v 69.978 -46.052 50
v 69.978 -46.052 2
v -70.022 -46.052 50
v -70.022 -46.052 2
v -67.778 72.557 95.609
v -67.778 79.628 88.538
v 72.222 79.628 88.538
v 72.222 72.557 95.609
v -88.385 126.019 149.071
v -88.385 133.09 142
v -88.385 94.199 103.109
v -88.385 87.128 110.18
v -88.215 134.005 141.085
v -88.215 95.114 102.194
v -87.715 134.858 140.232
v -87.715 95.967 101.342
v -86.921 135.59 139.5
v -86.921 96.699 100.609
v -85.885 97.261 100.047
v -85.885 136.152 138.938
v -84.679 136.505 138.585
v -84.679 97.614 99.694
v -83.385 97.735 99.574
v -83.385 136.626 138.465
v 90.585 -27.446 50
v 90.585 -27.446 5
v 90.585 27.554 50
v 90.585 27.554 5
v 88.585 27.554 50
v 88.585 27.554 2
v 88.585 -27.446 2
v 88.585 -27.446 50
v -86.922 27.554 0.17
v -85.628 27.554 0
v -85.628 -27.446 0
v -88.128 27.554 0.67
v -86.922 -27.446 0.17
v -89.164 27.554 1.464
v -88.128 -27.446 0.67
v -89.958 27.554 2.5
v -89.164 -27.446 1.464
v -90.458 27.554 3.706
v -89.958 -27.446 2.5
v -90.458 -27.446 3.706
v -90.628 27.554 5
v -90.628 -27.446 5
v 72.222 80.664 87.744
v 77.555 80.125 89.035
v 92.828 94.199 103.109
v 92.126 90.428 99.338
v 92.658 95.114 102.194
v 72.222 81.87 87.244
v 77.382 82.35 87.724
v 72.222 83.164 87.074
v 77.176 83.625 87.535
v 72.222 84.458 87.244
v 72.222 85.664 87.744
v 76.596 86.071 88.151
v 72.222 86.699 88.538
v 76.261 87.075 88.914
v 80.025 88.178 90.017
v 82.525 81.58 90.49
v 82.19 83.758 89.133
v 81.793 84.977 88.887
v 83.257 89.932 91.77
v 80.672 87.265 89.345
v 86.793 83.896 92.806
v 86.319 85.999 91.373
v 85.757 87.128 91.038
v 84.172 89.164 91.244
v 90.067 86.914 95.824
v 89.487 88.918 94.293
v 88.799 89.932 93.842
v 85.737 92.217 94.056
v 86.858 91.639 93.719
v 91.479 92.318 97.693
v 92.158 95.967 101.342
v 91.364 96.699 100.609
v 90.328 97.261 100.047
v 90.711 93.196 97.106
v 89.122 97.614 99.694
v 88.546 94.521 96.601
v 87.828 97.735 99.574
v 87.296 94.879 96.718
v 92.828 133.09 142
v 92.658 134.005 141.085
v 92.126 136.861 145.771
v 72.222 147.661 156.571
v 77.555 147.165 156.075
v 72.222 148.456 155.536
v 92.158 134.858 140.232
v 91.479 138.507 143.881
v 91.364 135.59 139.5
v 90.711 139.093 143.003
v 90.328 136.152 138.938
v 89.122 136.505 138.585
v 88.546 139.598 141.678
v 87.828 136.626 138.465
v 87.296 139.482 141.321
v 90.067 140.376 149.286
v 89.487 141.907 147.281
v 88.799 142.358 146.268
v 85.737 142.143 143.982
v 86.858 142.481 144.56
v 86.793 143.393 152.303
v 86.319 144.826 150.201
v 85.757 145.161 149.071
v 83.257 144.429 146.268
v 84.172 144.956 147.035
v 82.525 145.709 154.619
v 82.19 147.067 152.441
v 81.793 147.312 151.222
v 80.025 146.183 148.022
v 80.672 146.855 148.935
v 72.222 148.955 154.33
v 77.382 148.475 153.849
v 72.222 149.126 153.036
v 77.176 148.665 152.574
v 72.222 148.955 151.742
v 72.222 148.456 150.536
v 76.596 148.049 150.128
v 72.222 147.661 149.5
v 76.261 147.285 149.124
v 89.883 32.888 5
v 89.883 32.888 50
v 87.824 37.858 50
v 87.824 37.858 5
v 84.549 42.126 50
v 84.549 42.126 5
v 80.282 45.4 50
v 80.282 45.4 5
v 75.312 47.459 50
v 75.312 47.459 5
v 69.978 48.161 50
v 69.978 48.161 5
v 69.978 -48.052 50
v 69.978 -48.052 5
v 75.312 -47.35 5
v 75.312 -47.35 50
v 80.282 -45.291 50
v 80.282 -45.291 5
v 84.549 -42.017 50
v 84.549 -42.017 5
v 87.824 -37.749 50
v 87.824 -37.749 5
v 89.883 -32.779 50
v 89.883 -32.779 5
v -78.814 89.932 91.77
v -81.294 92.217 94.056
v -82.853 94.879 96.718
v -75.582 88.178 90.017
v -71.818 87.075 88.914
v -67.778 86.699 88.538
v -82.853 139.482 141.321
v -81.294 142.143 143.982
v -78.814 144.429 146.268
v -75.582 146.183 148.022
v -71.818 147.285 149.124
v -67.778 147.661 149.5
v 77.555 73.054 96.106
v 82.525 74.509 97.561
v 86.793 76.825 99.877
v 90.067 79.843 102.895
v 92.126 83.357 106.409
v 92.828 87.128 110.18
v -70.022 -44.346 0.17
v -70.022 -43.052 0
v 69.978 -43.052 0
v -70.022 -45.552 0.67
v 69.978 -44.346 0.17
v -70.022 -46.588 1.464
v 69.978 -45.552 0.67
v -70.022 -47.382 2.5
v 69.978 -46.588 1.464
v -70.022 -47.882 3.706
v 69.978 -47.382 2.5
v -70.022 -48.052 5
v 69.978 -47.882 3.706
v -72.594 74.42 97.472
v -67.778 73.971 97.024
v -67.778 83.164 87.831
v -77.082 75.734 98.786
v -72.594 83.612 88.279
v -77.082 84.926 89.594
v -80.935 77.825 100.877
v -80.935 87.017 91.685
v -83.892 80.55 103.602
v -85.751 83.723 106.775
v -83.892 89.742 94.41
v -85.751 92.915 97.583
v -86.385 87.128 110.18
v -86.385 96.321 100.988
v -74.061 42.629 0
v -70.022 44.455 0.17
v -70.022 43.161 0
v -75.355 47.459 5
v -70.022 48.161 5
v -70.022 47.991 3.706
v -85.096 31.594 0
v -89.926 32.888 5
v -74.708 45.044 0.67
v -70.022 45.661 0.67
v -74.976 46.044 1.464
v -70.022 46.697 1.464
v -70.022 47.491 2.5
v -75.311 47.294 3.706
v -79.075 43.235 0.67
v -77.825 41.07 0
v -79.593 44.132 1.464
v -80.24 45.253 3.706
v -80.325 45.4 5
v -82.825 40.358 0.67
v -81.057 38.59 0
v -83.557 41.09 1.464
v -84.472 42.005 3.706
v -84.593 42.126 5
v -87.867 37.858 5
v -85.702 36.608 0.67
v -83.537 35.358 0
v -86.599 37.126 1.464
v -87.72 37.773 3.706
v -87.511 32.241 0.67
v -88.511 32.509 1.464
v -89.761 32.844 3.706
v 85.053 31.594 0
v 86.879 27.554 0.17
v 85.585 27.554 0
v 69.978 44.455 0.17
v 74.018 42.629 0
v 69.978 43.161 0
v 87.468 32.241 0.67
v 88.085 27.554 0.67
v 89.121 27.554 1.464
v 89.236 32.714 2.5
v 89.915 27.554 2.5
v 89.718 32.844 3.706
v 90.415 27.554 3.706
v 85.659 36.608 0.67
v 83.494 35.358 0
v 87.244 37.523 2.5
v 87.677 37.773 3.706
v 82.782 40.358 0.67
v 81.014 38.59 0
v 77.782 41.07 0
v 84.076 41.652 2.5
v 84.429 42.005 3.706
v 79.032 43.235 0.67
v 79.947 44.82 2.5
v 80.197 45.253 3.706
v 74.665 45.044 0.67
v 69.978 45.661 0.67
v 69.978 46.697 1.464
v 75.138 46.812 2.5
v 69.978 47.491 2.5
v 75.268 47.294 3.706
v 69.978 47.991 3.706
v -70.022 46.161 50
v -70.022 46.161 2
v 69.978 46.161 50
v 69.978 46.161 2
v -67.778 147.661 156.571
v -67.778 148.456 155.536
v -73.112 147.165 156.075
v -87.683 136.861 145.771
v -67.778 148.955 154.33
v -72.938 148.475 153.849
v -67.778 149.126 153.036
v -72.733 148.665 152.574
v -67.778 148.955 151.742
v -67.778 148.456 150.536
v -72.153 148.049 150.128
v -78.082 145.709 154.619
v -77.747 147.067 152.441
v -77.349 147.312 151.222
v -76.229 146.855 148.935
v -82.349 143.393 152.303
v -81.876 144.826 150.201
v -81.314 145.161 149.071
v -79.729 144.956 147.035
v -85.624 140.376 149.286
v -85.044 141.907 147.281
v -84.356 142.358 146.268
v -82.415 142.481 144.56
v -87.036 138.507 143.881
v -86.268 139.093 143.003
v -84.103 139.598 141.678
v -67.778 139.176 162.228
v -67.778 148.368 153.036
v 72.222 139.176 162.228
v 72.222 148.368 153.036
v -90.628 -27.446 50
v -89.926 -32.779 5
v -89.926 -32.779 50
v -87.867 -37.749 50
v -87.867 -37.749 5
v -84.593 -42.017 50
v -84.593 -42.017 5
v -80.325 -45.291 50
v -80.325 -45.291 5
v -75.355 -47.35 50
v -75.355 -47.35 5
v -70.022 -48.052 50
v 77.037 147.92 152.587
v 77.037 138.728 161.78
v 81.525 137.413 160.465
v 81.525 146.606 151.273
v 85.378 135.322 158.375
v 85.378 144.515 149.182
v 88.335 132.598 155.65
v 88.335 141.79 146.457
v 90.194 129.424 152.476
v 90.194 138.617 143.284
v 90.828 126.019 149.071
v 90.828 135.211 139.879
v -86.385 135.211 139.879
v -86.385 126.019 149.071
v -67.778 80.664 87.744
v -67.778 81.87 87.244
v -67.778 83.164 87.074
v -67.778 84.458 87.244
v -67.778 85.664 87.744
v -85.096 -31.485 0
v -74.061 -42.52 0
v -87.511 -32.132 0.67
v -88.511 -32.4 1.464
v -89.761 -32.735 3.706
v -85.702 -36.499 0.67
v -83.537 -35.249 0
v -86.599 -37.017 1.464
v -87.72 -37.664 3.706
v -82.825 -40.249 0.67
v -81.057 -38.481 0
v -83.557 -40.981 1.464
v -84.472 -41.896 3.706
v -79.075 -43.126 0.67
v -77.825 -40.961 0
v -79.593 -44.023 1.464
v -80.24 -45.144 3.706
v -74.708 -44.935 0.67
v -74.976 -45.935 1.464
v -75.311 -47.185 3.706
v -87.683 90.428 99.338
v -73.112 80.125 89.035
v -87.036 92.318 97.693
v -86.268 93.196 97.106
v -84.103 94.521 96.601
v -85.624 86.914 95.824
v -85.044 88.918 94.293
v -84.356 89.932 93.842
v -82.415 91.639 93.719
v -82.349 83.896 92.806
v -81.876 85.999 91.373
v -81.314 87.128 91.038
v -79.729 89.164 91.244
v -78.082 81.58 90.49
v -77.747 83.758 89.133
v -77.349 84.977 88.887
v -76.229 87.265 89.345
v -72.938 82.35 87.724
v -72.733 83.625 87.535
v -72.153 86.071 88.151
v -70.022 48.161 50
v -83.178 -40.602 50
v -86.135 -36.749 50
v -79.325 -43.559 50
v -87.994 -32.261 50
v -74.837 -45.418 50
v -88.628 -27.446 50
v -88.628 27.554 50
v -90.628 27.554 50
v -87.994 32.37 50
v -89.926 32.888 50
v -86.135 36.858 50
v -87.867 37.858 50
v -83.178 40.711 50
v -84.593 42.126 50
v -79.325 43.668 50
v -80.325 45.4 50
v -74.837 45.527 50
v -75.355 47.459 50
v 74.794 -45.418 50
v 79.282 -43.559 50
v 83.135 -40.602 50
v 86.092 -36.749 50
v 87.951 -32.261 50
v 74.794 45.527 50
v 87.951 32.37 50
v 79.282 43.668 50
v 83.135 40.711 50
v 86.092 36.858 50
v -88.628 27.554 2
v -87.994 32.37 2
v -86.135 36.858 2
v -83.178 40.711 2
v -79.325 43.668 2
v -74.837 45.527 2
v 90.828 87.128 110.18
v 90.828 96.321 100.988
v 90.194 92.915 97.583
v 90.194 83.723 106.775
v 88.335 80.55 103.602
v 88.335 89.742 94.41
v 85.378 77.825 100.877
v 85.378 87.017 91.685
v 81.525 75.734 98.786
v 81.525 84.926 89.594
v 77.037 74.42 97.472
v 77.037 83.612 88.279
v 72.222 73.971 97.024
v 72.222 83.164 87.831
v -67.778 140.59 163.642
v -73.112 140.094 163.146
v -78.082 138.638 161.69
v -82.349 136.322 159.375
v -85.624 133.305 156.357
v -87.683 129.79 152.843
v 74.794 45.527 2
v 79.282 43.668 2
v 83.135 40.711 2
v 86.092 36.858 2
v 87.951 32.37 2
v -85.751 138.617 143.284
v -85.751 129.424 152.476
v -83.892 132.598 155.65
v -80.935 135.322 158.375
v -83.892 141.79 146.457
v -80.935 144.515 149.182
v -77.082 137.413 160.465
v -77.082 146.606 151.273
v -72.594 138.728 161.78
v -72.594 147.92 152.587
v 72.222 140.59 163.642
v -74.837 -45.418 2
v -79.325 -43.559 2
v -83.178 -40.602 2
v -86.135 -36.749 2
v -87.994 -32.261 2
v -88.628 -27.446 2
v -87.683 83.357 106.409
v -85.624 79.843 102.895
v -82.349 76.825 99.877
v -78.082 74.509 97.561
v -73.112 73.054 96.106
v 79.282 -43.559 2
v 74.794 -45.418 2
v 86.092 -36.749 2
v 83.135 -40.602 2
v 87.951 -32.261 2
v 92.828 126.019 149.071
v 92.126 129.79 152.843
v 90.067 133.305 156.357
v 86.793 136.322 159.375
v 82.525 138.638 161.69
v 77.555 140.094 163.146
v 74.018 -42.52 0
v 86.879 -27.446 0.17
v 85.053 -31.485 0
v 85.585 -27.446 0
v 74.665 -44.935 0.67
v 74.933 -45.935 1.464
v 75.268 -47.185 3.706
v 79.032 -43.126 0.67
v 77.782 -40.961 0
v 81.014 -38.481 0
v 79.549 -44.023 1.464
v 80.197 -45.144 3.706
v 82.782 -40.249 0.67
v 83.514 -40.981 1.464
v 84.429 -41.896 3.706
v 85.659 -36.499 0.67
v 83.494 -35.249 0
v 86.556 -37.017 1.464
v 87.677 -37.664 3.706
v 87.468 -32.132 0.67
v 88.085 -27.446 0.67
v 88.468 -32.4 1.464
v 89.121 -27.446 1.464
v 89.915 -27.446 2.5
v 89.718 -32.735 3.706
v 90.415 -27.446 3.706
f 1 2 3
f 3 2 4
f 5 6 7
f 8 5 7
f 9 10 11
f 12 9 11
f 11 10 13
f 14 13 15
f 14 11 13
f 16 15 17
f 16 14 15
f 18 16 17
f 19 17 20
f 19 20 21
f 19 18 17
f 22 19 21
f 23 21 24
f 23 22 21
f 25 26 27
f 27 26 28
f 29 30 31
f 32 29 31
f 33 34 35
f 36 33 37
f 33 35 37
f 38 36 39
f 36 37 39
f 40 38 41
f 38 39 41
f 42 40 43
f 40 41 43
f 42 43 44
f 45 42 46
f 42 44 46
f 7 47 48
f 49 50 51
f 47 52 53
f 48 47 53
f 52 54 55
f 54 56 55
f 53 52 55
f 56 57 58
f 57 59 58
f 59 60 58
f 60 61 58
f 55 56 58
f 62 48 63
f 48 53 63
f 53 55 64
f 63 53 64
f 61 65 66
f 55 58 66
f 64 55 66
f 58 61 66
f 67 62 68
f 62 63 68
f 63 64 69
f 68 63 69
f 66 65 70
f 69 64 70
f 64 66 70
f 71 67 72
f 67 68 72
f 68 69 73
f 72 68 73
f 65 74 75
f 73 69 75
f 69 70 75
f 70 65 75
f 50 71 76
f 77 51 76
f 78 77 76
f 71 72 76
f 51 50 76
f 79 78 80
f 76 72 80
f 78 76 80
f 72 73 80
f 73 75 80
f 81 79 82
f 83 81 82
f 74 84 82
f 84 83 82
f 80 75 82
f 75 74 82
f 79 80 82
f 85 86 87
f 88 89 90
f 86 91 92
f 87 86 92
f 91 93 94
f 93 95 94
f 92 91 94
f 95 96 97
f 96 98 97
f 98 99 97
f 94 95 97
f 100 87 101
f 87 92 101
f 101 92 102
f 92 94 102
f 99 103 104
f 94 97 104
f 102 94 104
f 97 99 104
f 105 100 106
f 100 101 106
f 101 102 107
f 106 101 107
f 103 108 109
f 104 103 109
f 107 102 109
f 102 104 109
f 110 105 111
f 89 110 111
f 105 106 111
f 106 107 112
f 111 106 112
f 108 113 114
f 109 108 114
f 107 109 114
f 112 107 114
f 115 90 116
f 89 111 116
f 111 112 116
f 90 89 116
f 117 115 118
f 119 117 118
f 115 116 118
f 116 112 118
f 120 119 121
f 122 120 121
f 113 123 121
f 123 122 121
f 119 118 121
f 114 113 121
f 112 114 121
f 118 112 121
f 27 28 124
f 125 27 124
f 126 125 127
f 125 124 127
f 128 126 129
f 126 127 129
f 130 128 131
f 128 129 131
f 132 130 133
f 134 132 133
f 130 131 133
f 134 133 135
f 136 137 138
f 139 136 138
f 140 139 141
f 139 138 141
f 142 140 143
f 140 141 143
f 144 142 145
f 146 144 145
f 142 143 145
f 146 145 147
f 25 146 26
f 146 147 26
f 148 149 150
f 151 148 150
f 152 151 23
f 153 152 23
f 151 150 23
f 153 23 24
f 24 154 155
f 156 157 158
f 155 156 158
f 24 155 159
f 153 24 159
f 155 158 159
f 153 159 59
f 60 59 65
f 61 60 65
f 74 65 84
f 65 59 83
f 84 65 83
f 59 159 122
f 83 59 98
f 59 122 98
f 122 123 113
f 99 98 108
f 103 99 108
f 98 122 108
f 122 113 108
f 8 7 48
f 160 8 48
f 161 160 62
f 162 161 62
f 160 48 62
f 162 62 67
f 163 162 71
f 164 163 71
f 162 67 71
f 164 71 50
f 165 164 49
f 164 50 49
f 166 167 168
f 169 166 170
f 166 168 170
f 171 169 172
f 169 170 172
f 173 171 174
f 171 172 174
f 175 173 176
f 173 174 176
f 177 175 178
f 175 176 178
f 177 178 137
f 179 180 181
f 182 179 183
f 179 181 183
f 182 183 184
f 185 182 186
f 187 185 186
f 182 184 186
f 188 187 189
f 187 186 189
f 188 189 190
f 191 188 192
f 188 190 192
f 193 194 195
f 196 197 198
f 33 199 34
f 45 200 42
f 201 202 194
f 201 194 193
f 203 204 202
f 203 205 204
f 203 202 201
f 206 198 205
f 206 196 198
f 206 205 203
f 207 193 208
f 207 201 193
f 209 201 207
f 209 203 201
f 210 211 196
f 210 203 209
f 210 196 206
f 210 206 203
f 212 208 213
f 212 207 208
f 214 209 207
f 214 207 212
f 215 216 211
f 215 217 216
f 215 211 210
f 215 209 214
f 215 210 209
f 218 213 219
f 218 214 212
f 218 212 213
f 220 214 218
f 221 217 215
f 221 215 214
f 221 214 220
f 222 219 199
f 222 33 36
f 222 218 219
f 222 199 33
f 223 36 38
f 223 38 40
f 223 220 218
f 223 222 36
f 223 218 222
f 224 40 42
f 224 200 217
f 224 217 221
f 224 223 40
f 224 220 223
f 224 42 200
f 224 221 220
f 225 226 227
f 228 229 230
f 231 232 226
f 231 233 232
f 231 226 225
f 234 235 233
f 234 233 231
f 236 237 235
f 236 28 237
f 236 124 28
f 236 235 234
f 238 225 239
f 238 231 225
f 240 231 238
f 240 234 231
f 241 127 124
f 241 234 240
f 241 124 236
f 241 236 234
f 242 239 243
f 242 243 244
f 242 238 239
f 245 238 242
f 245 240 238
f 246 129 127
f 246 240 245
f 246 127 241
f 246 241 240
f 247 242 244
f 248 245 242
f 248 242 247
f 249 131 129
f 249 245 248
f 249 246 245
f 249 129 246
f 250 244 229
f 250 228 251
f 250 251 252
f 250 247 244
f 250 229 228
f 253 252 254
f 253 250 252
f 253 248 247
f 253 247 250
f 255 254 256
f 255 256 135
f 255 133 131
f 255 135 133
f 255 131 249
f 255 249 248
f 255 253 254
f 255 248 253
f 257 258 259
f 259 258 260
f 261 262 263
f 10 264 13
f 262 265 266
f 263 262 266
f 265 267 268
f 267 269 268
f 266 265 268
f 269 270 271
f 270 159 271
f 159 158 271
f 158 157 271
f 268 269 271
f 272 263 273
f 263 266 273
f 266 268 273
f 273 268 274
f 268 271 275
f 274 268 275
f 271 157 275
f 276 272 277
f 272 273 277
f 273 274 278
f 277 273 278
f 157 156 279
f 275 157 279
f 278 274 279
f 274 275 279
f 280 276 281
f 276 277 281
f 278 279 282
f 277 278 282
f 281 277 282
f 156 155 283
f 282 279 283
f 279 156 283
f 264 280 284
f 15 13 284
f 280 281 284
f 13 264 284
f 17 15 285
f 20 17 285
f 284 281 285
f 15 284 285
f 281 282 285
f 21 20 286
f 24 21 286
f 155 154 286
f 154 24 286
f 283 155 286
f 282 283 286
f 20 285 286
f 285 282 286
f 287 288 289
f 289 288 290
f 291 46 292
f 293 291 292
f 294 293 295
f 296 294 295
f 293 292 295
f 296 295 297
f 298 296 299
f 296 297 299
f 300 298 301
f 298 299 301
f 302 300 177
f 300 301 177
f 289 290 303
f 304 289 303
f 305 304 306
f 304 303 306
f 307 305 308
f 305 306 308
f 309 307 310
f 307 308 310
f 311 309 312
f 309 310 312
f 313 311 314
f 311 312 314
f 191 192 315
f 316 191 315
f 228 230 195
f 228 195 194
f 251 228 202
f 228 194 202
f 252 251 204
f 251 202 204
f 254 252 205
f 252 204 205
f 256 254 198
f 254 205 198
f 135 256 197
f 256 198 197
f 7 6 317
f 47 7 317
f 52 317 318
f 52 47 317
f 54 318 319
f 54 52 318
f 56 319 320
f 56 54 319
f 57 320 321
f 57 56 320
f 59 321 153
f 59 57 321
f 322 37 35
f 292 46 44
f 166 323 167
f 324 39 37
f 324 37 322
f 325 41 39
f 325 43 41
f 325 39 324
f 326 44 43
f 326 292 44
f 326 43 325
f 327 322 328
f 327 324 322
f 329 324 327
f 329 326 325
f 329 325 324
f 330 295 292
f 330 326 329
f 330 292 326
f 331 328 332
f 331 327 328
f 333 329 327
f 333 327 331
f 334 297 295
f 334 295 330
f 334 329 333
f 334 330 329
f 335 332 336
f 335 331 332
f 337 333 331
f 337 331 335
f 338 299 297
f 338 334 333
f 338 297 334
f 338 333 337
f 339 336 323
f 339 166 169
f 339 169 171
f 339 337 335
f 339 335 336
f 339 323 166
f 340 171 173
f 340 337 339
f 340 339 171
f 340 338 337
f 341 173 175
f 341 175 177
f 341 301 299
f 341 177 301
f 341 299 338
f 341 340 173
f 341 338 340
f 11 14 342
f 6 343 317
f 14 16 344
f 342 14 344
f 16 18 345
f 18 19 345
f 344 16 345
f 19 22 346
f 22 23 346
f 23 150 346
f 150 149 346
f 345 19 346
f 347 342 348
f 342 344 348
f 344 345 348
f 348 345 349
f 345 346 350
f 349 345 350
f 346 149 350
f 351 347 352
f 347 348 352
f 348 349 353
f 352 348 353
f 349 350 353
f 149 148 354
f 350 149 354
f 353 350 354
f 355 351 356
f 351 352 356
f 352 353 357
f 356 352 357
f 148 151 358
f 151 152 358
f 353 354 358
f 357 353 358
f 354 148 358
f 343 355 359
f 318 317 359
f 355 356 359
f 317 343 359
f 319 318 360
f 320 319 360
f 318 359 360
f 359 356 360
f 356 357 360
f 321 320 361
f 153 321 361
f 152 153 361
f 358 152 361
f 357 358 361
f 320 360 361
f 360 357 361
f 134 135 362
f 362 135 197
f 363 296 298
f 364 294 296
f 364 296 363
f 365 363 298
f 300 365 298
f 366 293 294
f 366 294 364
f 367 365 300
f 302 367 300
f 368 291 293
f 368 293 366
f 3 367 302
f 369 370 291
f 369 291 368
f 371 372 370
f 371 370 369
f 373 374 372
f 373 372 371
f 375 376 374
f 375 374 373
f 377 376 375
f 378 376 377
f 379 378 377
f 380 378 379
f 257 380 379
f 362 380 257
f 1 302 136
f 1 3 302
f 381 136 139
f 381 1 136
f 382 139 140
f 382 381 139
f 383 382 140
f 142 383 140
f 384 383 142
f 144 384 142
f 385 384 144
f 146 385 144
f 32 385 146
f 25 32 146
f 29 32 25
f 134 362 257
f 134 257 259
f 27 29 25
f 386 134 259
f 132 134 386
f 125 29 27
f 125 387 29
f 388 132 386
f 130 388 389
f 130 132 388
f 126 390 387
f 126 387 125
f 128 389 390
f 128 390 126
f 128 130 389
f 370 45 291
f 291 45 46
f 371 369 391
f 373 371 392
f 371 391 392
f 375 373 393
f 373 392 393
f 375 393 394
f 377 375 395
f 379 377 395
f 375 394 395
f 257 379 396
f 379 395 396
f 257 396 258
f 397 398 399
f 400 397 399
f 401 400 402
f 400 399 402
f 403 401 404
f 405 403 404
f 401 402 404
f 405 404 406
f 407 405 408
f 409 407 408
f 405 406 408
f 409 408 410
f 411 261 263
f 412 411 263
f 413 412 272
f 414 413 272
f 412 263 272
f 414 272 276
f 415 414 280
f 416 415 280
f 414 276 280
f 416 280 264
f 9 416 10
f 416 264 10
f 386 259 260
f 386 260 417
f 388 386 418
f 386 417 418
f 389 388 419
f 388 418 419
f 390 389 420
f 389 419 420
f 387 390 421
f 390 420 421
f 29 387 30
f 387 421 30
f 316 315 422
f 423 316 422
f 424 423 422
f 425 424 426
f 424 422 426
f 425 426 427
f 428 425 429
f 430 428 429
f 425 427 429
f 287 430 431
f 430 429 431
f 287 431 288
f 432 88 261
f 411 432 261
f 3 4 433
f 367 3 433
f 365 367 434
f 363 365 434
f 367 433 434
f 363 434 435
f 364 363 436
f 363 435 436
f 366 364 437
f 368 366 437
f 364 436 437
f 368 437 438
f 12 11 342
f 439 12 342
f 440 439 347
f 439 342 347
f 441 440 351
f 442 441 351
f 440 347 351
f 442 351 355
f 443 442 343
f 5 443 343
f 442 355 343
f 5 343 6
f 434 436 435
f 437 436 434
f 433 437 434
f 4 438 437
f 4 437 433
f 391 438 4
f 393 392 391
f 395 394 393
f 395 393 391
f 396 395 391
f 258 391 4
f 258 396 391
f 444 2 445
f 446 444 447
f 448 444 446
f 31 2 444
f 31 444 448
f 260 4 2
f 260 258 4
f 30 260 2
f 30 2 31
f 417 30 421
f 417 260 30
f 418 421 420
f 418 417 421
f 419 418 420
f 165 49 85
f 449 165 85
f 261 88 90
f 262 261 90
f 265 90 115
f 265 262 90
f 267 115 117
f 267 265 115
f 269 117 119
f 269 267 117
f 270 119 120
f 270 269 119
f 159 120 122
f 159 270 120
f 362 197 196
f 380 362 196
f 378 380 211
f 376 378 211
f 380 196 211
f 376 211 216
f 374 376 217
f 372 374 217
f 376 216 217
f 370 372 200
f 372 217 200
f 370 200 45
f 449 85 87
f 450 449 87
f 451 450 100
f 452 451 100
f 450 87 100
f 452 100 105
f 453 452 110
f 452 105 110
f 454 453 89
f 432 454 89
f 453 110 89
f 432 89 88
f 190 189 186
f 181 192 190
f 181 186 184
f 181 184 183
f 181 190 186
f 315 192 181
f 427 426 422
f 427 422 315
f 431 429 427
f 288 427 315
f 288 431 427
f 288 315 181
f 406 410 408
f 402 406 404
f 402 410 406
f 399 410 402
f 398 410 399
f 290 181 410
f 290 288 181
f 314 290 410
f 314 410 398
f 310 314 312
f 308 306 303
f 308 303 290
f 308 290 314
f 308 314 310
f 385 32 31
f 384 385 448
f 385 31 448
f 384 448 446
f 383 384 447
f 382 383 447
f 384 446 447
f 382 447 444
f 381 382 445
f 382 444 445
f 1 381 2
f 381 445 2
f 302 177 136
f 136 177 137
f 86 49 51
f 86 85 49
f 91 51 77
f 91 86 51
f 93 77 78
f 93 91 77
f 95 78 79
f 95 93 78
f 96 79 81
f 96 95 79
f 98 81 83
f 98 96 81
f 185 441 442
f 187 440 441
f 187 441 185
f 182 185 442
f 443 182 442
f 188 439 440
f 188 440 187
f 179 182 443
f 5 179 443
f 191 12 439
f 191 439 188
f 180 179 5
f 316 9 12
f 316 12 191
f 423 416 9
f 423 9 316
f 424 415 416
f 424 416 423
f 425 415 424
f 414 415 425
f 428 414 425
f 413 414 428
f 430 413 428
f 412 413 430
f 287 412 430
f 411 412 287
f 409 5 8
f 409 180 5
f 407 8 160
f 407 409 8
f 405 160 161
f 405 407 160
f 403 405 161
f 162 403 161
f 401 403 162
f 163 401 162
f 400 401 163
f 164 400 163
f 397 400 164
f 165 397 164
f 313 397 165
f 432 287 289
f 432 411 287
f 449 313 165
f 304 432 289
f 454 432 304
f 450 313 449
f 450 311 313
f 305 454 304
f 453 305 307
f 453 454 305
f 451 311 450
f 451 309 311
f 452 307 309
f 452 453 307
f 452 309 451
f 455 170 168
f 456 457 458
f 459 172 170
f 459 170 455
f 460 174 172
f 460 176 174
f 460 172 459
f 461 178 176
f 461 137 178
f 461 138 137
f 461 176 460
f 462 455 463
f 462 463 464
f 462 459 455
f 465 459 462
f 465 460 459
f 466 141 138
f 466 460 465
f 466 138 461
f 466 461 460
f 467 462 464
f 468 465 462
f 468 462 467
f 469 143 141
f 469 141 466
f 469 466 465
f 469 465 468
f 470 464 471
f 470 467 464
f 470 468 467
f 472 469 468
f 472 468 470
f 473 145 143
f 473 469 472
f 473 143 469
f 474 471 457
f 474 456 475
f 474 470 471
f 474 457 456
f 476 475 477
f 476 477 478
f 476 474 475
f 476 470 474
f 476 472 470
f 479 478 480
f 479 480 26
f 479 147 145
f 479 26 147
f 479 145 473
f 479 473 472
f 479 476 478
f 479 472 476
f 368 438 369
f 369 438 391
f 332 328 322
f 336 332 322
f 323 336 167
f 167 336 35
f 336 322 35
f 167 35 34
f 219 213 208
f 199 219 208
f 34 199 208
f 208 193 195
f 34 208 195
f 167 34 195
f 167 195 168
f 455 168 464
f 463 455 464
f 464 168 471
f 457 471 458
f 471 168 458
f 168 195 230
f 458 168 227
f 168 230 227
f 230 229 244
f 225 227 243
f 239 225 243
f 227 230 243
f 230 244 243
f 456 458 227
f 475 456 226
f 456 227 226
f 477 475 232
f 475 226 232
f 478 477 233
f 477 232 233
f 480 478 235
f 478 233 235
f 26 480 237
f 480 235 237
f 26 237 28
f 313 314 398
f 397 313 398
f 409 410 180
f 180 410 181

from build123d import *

# Parameters (mm, degrees)
F1_DEPTH = 50
F2_DEPTH = 2
F5_DEPTH = 2
F6_DEPTH = 15
F8_W     = 20
F8_H     = 2.4975641537
F9_DEPTH = 2
F10_R    = 5
F11_R    = 5


# Not quite as in the source:
# - a feature names something its author has since deleted; it is built from what else it names


with BuildPart() as f1:
    # F0 (on Top) → F1 (new body)
    with BuildSketch(Plane.XY):
        with BuildLine():
            ThreePointArc((-70.0215809153, 48.1610759377), (-84.5926481603, 42.1255410641), (-90.6281816654, 27.5544732523))
            Line((-90.6281816654, 27.5544732523), (-90.6281816654, -27.4455267477))
            ThreePointArc((-90.6281816654, -27.4455267477), (-84.5926486755, -42.0165950962), (-70.0215808636, -48.0521293815))
            Line((-70.0215808636, -48.0521293815), (69.9784191364, -48.0521293815))
            ThreePointArc((69.9784191364, -48.0521293815), (84.5494875406, -42.0165959566), (90.5850234457, -27.4455285797))
            Line((90.5850234457, -27.4455285797), (90.5850234457, 27.5544733039))
            ThreePointArc((90.5850234457, 27.5544733039), (84.5494881549, 42.1255418682), (69.9784190847, 48.1610759377))
            Line((69.9784190847, 48.1610759377), (-70.0215809153, 48.1610759377))
        make_face()
        with BuildLine():
            Line((69.9784191364, -46.0521293815), (-70.0215808636, -46.0521293815))
            ThreePointArc((-70.0215808636, -46.0521293815), (-83.1784344654, -40.6023821815), (-88.6281816654, -27.4455285797))
            Line((-88.6281816654, -27.4455285797), (-88.6281816654, 27.5544732523))
            ThreePointArc((-88.6281816654, 27.5544732523), (-83.1784345979, 40.7113275017), (-70.0215809153, 46.1610759377))
            Line((-70.0215809153, 46.1610759377), (69.9784190847, 46.1610759377))
            ThreePointArc((69.9784190847, 46.1610759377), (83.1352739819, 40.7113282011), (88.5850217185, 27.5544733039))
            Line((88.5850217185, 27.5544733039), (88.5850217185, -27.4455285797))
            ThreePointArc((88.5850217185, -27.4455285797), (83.1352733676, -40.6023822895), (69.9784191364, -46.0521293815))
        make_face(mode=Mode.SUBTRACT)
    extrude(amount=F1_DEPTH)

    # F0 (on Top) → F2 (join)
    with BuildSketch(Plane.XY):
        with BuildLine():
            ThreePointArc((-88.6281816654, -27.4455285797), (-83.1784344654, -40.6023821815), (-70.0215808636, -46.0521293815))
            Line((-70.0215808636, -46.0521293815), (69.9784191364, -46.0521293815))
            ThreePointArc((69.9784191364, -46.0521293815), (83.1352733676, -40.6023822895), (88.5850217185, -27.4455285797))
            Line((88.5850217185, -27.4455285797), (88.5850217185, 27.5544733039))
            ThreePointArc((88.5850217185, 27.5544733039), (83.1352739819, 40.7113282011), (69.9784190847, 46.1610759377))
            Line((69.9784190847, 46.1610759377), (-70.0215809153, 46.1610759377))
            ThreePointArc((-70.0215809153, 46.1610759377), (-83.1784345979, 40.7113275017), (-88.6281816654, 27.5544732523))
            Line((-88.6281816654, 27.5544732523), (-88.6281816654, -27.4455285797))
        make_face()
    extrude(amount=F2_DEPTH)

    # F8 (on face) → F9 (cut)
    with BuildSketch(Plane(origin=(0, 84.0832325734, 84.0832325734), x_dir=(1, 0, 0), z_dir=(0, -0.7071067812, -0.7071067812))):
        with Locations((0, -0.5405465653)):
            Rectangle(F8_W, F8_H)
    extrude(amount=-F9_DEPTH, mode=Mode.SUBTRACT)

    # F11
    f11_edges = [f1.edges().sort_by_distance(p)[0] for p in [
        (-0.021581, 48.161076, 0),
        (-84.592648, 42.125541, 0),
        (-90.628182, 0.054473, 0),
        (-84.592649, -42.016595, 0),
        (-0.021581, -48.052129, 0),
        (84.549488, -42.016596, 0),
        (90.585023, 0.054472, 0),
        (84.549488, 42.125542, 0),
    ]]
    fillet(f11_edges, radius=F11_R)


with BuildPart() as f5:
    # F4 (on face) → F5 (new body)
    with BuildSketch(Plane(origin=(0, -0.9194620312, 0.9194620312), x_dir=(1, 0, 0), z_dir=(0, -0.7071067812, 0.7071067812))):
        with BuildLine():
            ThreePointArc((-86.3849869775, 139.5182486753), (-80.9352397774, 126.3613950735), (-67.7783861756, 120.9116478734))
            Line((-67.7783861756, 120.9116478734), (72.2216138244, 120.9116478734))
            ThreePointArc((72.2216138244, 120.9116478734), (85.3784680556, 126.3613949655), (90.8282164065, 139.5182486753))
            Line((90.8282164065, 139.5182486753), (90.8282164065, 194.5182505589))
            ThreePointArc((90.8282164065, 194.5182505589), (85.3784686699, 207.675105456), (72.2216137727, 213.1248531926))
            Line((72.2216137727, 213.1248531926), (-67.7783862273, 213.1248531926))
            ThreePointArc((-67.7783862273, 213.1248531926), (-80.93523991, 207.6751047567), (-86.3849869775, 194.5182505072))
            Line((-86.3849869775, 194.5182505072), (-86.3849869775, 139.5182486753))
        make_face()
    extrude(amount=F5_DEPTH)

    # F4 (on face) → F6 (join)
    with BuildSketch(Plane(origin=(0, -0.9194620312, 0.9194620312), x_dir=(1, 0, 0), z_dir=(0, -0.7071067812, 0.7071067812))):
        with BuildLine():
            ThreePointArc((-67.7783862273, 215.1248531926), (-82.3494534723, 209.0893183191), (-88.3849869775, 194.5182505072))
            Line((-88.3849869775, 194.5182505072), (-88.3849869775, 139.5182505072))
            ThreePointArc((-88.3849869775, 139.5182505072), (-82.3494539875, 124.9471821588), (-67.7783861756, 118.9116478734))
            Line((-67.7783861756, 118.9116478734), (72.2216138244, 118.9116478734))
            ThreePointArc((72.2216138244, 118.9116478734), (86.7926822286, 124.9471812983), (92.8282181337, 139.5182486753))
            Line((92.8282181337, 139.5182486753), (92.8282181337, 194.5182505589))
            ThreePointArc((92.8282181337, 194.5182505589), (86.7926828429, 209.0893191232), (72.2216137727, 215.1248531926))
            Line((72.2216137727, 215.1248531926), (-67.7783862273, 215.1248531926))
        make_face()
        with BuildLine():
            Line((72.2216138244, 120.9116478734), (-67.7783861756, 120.9116478734))
            ThreePointArc((-67.7783861756, 120.9116478734), (-80.9352397774, 126.3613950735), (-86.3849869775, 139.5182486753))
            Line((-86.3849869775, 139.5182486753), (-86.3849869775, 194.5182505072))
            ThreePointArc((-86.3849869775, 194.5182505072), (-80.93523991, 207.6751047567), (-67.7783862273, 213.1248531926))
            Line((-67.7783862273, 213.1248531926), (72.2216137727, 213.1248531926))
            ThreePointArc((72.2216137727, 213.1248531926), (85.3784686699, 207.675105456), (90.8282164065, 194.5182505589))
            Line((90.8282164065, 194.5182505589), (90.8282164065, 139.5182486753))
            ThreePointArc((90.8282164065, 139.5182486753), (85.3784680556, 126.3613949655), (72.2216138244, 120.9116478734))
        make_face(mode=Mode.SUBTRACT)
    extrude(amount=F6_DEPTH)

    # F10
    f10_edges = [f5.edges().sort_by_distance(p)[0] for p in [
        (-82.349453, 146.929013, 148.767937),
        (-88.384987, 117.180275, 119.0192),
        (-82.349454, 87.431538, 89.270462),
        (2.221614, 83.163771, 85.002695),
        (86.792682, 87.431537, 89.270461),
        (92.828218, 117.180275, 119.019199),
        (86.792683, 146.929013, 148.767937),
        (2.221614, 151.19678, 153.035705),
    ]]
    fillet(f10_edges, radius=F10_R)


solid = Compound([f1.part, f5.part])
